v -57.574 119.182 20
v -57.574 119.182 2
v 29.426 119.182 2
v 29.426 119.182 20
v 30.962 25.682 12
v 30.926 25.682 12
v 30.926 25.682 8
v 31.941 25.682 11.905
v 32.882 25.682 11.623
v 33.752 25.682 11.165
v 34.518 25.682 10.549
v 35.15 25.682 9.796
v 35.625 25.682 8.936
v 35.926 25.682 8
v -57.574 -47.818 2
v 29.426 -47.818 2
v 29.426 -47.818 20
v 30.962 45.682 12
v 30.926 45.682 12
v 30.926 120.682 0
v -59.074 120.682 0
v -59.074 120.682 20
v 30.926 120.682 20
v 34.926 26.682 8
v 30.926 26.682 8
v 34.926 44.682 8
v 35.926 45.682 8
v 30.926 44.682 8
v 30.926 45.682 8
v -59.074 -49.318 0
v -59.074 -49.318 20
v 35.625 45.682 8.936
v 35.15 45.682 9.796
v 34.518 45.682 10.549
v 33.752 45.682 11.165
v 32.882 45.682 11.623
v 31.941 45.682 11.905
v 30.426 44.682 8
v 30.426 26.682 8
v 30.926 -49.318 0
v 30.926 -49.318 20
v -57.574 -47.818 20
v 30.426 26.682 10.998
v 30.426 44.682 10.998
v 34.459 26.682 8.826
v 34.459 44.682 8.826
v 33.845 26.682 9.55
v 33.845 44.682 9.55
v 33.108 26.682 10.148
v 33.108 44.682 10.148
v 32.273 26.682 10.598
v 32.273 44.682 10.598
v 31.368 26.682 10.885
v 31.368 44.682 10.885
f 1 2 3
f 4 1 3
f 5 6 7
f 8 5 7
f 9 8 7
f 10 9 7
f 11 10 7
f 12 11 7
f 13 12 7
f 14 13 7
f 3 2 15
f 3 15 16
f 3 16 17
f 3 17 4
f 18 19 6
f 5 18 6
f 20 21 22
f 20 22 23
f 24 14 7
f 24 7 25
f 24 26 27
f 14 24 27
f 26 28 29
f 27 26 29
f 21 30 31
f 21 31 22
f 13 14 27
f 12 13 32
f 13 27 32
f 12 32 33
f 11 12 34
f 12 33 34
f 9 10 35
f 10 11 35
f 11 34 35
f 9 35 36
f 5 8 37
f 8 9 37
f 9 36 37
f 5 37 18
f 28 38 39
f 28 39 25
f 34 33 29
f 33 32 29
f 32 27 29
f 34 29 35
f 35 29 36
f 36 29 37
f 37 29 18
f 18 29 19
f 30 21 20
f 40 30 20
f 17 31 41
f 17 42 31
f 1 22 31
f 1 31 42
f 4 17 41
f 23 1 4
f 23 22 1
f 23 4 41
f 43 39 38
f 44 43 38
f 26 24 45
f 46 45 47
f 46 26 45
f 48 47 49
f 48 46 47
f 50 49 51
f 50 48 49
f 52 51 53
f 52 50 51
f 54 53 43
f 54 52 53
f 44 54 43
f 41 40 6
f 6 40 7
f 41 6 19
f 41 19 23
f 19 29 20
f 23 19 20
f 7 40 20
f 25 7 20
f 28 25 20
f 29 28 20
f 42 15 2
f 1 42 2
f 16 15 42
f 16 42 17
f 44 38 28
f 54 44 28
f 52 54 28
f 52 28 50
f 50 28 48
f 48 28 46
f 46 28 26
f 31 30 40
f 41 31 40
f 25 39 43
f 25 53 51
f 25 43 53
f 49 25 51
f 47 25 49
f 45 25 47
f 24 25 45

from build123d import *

# Parameters (mm, degrees)
F0_W         = 90
F0_H         = 170
F0_W_2       = 87
F0_H_2       = 167
F1_DEPTH     = 20
F2_DEPTH     = 2
F4_DEPTH     = 5
F5_T         = 1
F5_T3_DEPTH  = 6
F5_T5_DEPTH  = 22
F5_T7_DEPTH  = 89
F5_T9_DEPTH  = 20
F5_T11_DEPTH = 169
F6_T4_DEPTH  = 29.5866302263
F6_T6_DEPTH  = 44.819347292


# Not quite as in the source:
# - a fillet or chamfer that OpenCascade refuses, or shapes differently, is made with other operations: its cross-section is extruded or revolved along the edge and cut away or added
# - a shell that OpenCascade refuses in one call is made with other operations: the cavity is built on its own and cut out


with BuildPart() as f1:
    # F0 (on Top) → F1 (new body)
    with BuildSketch(Plane.XY):
        with Locations((-14.0737314522, 35.681976974)):
            Rectangle(F0_W, F0_H)
        with Locations((-14.0737314522, 35.681976974)):
            Rectangle(F0_W_2, F0_H_2, mode=Mode.SUBTRACT)
    extrude(amount=F1_DEPTH)

    # F0 (on Top) → F2 (join)
    with BuildSketch(Plane.XY):
        with Locations((-14.0737314522, 35.681976974)):
            Rectangle(F0_W_2, F0_H_2)
    extrude(amount=F2_DEPTH)

    # F3 (on face) → F4 (join)
    with BuildSketch(Plane.YZ.offset(30.9262685478)):
        Polygon((45.681976974, 12), (35.681976974, 12), (25.681976974, 12), (25.681976974, 8), (45.681976974, 8), align=None)
    extrude(amount=F4_DEPTH)

    # F5: shell of thickness 1, made by hand


with BuildPart() as f5_core1:
    # F5_t2: copy of F1
    add(f1.part)

    # the walls: a layer under each face that stays
    f5_faces = [f5_core1.faces().sort_by_distance(p)[0] for p in [
        (30.9262685478, -20.9846896927, 16.6666666667),
        (-14.0737314522, -49.318023026, 10),
        (-14.0737314522, 35.681976974, 0),
        (-57.6674814522, 85.0029646283, 20),
        (-14.0737314522, 120.681976974, 10),
        (33.4262685478, 45.681976974, 10),
        (33.4262685478, 25.681976974, 10),
        (33.4262685478, 35.681976974, 12),
        (-59.0737314522, 35.681976974, 10),
        (-14.0737314522, -47.818023026, 11),
        (-57.5737314522, 35.681976974, 11),
        (-14.0737314522, 119.181976974, 11),
        (29.4262685478, 35.681976974, 11),
        (35.9262685478, 35.681976974, 10),
        (-14.0737314522, 35.681976974, 2),
    ]]
    thicken(f5_faces, amount=-F5_T, mode=Mode.SUBTRACT)

    # F5_s4 → F5_t3 (cut)
    with BuildSketch(Plane.XY.offset(7)):
        Polygon((30.9362685478, 45.691976974), (29.9262685478, 45.681976974), (29.9262685478, 44.681976974), (30.9262685478, 44.681976974), align=None)
        Polygon((30.9362685478, 25.671976974), (29.9262685478, 25.681976974), (29.9262685478, 26.681976974), (30.9262685478, 26.681976974), align=None)
    extrude(amount=F5_T3_DEPTH, mode=Mode.SUBTRACT)

    # F5_s6 → F5_t5 (cut)
    with BuildSketch(Plane.XZ.offset(-46.681976974)):
        Polygon((30.9362685478, 12.01), (29.9262685478, 12), (29.9262685478, 11), (30.9262685478, 11), align=None)
    extrude(amount=F5_T5_DEPTH, mode=Mode.SUBTRACT)

    # F5_s8 → F5_t7 (cut)
    with BuildSketch(Plane.YZ.offset(-58.5737314522)):
        Polygon((-47.808023026, 2.01), (-48.818023026, 2), (-48.818023026, 1), (-47.818023026, 1), align=None)
        Polygon((119.171976974, 2.01), (120.181976974, 2), (120.181976974, 1), (119.181976974, 1), align=None)
    extrude(amount=F5_T7_DEPTH, mode=Mode.SUBTRACT)

    # F5_s10 → F5_t9 (cut)
    with BuildSketch(Plane.XY.offset(1)):
        Polygon((-57.5637314522, -47.808023026), (-57.5737314522, -48.818023026), (-58.5737314522, -48.818023026), (-58.5737314522, -47.818023026), align=None)
        Polygon((29.4162685478, -47.808023026), (29.4262685478, -48.818023026), (30.4262685478, -48.818023026), (30.4262685478, -47.818023026), align=None)
        Polygon((-57.5637314522, 119.171976974), (-58.5737314522, 119.181976974), (-58.5737314522, 120.181976974), (-57.5737314522, 120.181976974), align=None)
        Polygon((29.4162685478, 119.171976974), (29.4262685478, 120.181976974), (30.4262685478, 120.181976974), (30.4262685478, 119.181976974), align=None)
    extrude(amount=F5_T9_DEPTH, mode=Mode.SUBTRACT)

    # F5_s12 → F5_t11 (cut)
    with BuildSketch(Plane.XZ.offset(-120.181976974)):
        Polygon((-57.5637314522, 2.01), (-58.5737314522, 2), (-58.5737314522, 1), (-57.5737314522, 1), align=None)
        Polygon((29.4162685478, 2.01), (30.4262685478, 2), (30.4262685478, 1), (29.4262685478, 1), align=None)
    extrude(amount=F5_T11_DEPTH, mode=Mode.SUBTRACT)


with BuildPart() as f1_1:
    add(f1.part)

    # what is left inside the walls is the cavity
    f5_cavity = [f5_core1.part.solids().sort_by_distance(p)[0] for p in [
        (32.676269, 32.681977, 8.01),
    ]]
    add(f5_cavity, mode=Mode.SUBTRACT)

    # F6: fillet of radius 5.08 on 5 edges, made by hand


with BuildPart() as f6_tool2:
    # F6_s3 → F6_t4 (new body)
    with BuildSketch(Plane.XZ.offset(-56.2686072003)):
        with BuildLine():
            ThreePointArc((34.9262685478, 8), (33.0520512056, 10.1845515591), (30.2916164573, 11))
            Line((30.2916164573, 11), (34.9262685478, 11))
            Line((34.9262685478, 11), (34.9262685478, 8))
        make_face()
    extrude(amount=F6_T4_DEPTH)

    split(bisect_by=Plane.XZ.offset(-45.681976974), keep=Keep.TOP)


with BuildPart() as f1_2:
    add(f1_1.part)

    # F6_t1: union F6_tool2
    add(f6_tool2.part)

    # F6_s7 → F6_t6 (cut)
    with BuildSketch(Plane.XZ.offset(-58.09165062)):
        with BuildLine():
            ThreePointArc((35.9262685478, 8), (34.1498745795, 10.8755530587), (30.9623990894, 12))
            Line((30.9623990894, 12), (35.9262685478, 12))
            Line((35.9262685478, 12), (35.9262685478, 8))
        make_face()
    extrude(amount=F6_T6_DEPTH, mode=Mode.SUBTRACT)


solid = f1_2.part
